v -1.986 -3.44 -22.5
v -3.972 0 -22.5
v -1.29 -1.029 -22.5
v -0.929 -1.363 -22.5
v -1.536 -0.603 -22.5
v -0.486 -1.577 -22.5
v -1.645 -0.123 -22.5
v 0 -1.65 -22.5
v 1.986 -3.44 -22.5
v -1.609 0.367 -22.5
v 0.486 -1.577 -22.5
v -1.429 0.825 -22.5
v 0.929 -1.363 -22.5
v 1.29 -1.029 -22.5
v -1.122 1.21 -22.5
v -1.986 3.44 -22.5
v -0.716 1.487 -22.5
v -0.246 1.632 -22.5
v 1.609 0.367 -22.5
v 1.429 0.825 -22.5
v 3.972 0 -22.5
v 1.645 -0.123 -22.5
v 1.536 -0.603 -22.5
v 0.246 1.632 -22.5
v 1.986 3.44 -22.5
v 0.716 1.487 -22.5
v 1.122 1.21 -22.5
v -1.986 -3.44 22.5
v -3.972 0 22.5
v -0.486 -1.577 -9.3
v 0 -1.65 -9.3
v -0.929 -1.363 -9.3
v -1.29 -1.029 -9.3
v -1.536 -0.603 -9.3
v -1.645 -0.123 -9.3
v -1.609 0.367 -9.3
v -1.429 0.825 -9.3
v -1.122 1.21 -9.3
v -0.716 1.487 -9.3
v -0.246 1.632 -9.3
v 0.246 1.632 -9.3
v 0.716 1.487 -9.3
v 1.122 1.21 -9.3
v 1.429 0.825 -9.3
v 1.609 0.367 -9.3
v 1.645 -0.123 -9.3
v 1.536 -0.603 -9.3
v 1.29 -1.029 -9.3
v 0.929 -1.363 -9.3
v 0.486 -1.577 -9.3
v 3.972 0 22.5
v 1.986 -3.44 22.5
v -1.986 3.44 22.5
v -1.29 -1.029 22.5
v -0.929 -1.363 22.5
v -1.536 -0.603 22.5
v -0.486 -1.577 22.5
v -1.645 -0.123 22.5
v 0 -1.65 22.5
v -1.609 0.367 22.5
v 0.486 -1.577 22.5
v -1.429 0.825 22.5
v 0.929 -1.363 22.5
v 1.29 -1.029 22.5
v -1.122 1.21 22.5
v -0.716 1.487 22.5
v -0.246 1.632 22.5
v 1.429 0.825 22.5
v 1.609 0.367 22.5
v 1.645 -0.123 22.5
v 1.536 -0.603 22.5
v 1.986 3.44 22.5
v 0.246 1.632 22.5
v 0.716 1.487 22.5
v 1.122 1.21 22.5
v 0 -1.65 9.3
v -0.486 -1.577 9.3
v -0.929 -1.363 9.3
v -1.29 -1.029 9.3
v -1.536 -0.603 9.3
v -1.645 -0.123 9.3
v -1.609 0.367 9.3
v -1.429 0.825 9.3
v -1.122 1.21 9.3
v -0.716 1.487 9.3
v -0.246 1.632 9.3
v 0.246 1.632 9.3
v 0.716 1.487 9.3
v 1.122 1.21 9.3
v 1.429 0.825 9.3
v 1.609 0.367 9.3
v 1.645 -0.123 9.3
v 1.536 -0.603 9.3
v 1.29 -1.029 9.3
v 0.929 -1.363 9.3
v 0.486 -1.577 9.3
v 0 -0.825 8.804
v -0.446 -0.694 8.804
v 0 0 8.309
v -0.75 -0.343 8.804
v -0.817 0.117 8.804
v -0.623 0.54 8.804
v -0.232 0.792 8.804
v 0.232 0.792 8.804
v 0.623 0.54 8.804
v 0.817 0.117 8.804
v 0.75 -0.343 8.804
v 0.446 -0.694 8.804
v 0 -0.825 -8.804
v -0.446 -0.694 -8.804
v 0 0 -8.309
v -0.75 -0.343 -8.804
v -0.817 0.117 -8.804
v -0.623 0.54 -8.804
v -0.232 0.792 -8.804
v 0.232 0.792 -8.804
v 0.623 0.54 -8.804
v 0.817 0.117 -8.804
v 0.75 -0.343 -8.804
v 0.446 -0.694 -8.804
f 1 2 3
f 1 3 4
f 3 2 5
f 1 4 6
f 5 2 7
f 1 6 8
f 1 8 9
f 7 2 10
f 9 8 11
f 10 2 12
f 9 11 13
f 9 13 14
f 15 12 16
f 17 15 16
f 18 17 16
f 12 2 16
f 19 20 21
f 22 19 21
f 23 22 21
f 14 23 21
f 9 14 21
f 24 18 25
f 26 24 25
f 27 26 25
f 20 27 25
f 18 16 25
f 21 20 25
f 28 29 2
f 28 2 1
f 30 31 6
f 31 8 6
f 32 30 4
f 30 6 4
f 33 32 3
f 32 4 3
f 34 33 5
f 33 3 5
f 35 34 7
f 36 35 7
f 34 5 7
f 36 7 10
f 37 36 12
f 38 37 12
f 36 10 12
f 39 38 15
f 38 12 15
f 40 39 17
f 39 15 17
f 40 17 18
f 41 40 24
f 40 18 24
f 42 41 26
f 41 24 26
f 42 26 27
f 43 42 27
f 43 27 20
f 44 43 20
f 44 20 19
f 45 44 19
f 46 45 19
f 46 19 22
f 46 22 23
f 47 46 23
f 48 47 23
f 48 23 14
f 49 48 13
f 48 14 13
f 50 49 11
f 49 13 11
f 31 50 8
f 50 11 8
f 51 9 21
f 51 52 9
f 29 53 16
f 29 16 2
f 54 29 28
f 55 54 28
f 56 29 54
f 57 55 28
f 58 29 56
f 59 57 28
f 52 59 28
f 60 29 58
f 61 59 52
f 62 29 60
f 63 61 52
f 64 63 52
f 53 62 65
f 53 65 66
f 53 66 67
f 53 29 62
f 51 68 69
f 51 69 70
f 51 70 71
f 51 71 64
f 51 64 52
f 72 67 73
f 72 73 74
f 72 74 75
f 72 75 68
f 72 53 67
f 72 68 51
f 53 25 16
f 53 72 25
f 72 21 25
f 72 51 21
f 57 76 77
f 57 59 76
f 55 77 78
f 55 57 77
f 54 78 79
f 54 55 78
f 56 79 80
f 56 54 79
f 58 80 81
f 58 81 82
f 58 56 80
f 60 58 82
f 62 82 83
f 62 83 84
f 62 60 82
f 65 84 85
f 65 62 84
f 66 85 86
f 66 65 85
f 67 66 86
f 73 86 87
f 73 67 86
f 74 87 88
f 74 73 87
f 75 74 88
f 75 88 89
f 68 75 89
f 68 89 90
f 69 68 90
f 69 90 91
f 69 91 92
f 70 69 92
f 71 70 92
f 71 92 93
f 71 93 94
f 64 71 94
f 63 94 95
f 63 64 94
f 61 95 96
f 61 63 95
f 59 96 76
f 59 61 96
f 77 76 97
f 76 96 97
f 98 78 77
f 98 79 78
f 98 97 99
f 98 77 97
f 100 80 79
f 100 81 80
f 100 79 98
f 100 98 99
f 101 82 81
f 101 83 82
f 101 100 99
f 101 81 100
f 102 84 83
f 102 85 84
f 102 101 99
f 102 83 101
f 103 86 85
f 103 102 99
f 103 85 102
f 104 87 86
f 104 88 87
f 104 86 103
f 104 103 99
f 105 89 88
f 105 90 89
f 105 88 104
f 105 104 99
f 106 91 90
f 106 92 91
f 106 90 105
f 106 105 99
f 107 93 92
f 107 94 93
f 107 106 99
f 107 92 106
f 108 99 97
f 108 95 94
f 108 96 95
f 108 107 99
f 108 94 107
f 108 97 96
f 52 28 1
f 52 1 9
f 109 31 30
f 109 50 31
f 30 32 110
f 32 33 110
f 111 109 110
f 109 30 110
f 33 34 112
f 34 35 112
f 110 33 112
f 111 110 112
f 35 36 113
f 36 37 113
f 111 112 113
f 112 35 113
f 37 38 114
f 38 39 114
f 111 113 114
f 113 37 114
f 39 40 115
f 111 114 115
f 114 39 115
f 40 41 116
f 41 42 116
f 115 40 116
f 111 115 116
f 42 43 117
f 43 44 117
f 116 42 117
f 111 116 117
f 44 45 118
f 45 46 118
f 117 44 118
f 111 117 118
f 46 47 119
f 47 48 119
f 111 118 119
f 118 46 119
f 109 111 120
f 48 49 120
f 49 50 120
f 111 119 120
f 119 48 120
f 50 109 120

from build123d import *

# Parameters (mm, degrees)
EXTRUDE_340_DEPTH = 22.5


with BuildPart() as part:
    # 草图1 → Extrude 340 (new body, symmetric)
    with BuildSketch(Plane.XY):
        Polygon((1.986084926, 3.44), (-1.986084926, 3.44), (-3.972169852, 0), (-1.986084926, -3.44), (1.986084926, -3.44), (3.972169852, 0), align=None)
    extrude(amount=EXTRUDE_340_DEPTH, both=True)

    # 草图3 → 螺纹孔1 (revolve, cut)
    with BuildSketch(Plane(origin=(0, 0, 22.5), x_dir=(0, -1, 0), z_dir=(1, 0, 0))):
        Polygon((0, 0), (0, 14.191420021), (1.65, 13.2), (1.65, 0), align=None)
    hole_wizard_1 = revolve(axis=Axis((0, 0, 28.85), (0, 0, -1)), mode=Mode.SUBTRACT)

    # 镜向1: 螺纹孔1 across plane
    add(hole_wizard_1.mirror(Plane.XY), mode=Mode.SUBTRACT)


solid = part.part
